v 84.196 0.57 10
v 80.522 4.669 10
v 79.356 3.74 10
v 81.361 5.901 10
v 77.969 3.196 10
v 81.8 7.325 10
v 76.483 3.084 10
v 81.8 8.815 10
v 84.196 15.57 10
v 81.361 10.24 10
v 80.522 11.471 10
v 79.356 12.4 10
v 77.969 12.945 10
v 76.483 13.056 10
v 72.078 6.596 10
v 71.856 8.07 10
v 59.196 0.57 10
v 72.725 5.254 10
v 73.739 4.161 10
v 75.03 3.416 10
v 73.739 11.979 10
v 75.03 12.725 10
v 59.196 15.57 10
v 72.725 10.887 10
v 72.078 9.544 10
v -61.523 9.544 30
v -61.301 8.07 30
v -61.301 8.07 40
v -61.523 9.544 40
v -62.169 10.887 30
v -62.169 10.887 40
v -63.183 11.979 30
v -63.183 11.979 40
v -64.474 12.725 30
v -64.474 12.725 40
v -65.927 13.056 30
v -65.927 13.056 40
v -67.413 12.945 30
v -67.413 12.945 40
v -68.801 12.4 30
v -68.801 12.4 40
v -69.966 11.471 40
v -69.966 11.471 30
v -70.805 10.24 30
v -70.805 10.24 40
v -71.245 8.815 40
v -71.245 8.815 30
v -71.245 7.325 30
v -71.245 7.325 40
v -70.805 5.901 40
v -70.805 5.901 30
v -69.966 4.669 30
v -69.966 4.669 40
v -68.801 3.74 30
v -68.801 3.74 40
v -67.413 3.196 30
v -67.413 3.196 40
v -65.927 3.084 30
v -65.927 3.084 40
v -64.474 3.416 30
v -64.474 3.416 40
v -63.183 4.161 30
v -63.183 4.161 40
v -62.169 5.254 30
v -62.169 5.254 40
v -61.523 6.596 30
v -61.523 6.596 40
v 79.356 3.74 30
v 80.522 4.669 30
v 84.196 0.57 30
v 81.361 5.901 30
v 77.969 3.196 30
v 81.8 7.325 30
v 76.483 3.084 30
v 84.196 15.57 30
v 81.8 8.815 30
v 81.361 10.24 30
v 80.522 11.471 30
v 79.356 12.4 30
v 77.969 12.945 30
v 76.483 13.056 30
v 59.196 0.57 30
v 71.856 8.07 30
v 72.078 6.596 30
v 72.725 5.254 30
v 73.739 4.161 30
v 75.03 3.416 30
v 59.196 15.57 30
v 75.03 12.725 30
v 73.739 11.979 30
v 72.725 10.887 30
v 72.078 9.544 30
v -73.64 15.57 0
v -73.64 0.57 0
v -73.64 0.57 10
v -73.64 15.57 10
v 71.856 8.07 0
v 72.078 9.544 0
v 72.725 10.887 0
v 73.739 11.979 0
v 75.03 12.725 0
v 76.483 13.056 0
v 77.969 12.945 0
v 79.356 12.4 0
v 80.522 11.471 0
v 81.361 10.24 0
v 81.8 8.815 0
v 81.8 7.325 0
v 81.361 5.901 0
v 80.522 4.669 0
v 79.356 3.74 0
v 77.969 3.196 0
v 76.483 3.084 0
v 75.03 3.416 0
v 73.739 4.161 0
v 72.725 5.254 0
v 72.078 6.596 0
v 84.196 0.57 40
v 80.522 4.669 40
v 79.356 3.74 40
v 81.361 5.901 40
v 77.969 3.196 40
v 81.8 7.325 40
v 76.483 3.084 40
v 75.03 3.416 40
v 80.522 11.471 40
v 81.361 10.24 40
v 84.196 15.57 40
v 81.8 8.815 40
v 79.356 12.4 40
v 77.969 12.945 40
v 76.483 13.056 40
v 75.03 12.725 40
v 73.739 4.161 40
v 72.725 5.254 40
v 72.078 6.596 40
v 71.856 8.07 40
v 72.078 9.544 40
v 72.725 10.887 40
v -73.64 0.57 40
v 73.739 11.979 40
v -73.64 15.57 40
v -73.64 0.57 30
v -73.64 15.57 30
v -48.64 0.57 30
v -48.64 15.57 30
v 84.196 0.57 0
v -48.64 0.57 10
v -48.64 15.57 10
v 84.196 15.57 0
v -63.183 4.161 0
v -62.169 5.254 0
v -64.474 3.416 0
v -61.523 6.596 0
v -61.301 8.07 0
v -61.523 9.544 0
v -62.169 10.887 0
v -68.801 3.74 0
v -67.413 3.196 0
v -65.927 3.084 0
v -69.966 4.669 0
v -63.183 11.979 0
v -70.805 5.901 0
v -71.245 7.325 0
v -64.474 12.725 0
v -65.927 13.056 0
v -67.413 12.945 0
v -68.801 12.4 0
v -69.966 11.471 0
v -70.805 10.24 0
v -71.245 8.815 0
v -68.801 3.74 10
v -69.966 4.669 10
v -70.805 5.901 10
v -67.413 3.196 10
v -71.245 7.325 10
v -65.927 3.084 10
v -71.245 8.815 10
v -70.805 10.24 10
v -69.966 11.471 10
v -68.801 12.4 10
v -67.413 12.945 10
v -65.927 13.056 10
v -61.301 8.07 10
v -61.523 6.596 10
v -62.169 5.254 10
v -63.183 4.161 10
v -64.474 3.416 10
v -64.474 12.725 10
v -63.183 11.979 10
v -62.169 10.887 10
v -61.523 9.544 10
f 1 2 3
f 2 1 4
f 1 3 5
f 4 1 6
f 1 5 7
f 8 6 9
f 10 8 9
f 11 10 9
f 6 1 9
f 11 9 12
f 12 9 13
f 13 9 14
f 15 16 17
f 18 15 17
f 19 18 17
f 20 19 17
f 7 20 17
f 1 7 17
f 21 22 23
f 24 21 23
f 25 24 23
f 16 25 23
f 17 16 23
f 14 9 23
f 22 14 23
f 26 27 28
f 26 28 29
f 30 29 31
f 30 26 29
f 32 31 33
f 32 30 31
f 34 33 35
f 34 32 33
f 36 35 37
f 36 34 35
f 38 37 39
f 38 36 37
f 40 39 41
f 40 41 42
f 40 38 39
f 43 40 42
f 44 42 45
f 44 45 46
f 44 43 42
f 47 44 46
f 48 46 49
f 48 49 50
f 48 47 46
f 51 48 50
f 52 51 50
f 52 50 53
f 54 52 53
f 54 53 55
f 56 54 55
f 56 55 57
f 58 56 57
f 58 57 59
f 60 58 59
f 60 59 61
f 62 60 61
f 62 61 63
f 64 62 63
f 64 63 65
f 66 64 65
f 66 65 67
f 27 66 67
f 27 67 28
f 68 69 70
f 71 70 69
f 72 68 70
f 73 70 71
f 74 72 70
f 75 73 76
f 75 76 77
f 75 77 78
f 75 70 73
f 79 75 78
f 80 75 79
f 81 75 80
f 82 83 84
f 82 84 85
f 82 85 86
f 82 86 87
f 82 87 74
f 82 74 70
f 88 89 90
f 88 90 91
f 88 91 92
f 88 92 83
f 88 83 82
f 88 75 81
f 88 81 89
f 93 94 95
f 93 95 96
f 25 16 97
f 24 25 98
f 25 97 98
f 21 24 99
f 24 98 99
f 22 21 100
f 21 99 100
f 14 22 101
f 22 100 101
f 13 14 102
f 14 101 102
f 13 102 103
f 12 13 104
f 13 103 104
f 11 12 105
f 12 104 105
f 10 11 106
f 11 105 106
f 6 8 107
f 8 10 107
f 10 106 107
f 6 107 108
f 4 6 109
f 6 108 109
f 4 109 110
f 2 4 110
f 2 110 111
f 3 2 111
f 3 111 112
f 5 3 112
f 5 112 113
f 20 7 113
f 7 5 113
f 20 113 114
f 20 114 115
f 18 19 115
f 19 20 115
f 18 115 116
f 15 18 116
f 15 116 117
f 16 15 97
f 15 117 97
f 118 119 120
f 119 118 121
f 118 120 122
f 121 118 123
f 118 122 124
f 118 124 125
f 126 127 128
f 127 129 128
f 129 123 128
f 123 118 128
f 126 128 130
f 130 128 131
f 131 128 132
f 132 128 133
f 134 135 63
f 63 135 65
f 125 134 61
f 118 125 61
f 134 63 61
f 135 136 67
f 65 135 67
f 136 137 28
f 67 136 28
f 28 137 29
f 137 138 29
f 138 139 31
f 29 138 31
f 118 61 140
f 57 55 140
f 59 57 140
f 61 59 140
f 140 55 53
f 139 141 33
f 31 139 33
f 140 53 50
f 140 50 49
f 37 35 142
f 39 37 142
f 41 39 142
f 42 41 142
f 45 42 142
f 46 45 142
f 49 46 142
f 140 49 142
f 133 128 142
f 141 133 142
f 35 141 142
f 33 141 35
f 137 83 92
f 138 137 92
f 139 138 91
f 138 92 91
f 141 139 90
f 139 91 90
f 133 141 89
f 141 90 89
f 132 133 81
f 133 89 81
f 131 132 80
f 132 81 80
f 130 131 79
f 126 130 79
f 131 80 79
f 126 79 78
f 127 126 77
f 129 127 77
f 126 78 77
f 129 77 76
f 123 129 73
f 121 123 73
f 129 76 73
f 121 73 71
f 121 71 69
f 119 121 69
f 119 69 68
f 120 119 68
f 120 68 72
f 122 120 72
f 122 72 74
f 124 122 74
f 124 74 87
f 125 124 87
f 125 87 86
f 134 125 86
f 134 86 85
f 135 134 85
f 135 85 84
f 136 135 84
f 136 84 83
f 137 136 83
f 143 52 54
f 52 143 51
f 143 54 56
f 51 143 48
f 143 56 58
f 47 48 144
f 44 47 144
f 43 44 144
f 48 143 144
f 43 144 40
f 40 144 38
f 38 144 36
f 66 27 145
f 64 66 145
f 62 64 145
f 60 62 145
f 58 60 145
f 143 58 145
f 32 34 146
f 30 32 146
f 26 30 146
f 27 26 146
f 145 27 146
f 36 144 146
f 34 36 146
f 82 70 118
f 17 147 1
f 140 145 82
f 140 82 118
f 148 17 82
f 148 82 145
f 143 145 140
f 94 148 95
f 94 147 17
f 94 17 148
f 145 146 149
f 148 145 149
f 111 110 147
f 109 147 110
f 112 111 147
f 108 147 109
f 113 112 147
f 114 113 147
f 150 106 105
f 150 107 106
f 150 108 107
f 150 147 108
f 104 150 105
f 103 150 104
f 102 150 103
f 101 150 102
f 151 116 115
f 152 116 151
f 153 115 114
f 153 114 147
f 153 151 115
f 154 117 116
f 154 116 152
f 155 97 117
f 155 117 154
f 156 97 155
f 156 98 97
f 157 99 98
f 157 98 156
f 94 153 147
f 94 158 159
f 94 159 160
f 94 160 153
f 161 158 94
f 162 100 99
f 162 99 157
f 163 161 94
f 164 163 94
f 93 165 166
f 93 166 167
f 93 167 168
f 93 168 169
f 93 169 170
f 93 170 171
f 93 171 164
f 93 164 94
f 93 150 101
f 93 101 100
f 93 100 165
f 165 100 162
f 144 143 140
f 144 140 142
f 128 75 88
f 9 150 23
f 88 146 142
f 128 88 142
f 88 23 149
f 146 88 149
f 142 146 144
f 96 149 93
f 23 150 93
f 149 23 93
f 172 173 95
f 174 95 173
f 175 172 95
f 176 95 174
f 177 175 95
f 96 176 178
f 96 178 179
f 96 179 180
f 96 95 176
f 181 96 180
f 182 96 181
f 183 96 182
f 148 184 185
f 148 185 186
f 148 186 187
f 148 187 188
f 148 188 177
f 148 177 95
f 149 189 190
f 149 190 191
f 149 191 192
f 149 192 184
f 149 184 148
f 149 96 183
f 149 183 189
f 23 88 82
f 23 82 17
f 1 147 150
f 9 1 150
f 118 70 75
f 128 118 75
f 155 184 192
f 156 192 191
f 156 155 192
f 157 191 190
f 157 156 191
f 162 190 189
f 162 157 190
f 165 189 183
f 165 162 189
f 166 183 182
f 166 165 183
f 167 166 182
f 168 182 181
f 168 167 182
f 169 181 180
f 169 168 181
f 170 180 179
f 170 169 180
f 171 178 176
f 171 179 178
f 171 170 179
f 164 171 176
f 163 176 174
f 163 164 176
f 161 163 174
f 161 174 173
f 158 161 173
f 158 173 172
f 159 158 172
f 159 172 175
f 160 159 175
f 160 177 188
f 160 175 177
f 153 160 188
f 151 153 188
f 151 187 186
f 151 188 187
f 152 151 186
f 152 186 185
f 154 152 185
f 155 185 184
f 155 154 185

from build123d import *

# Parameters (mm, degrees)
SKETCH_1_W          = 200
SKETCH_1_H          = 15
SKETCH_1_R          = 5
EXTRUDE_2_DEPTH     = 40
SKETCH_2_W          = 50
SKETCH_2_H          = 20
CUT_EXTRUDE_2_DEPTH = 40
SKETCH_3_W          = 242.163651579
SKETCH_3_H          = 102.30151502
CUT_EXTRUDE_3_DEPTH = 40


with BuildPart() as part:
    # 草图1 → 凸台-拉伸2 (new body)
    with BuildSketch(Plane.XY):
        with Locations((26.359649123, 8.070175439)):
            Rectangle(SKETCH_1_W, SKETCH_1_H)
        with Locations((-66.300631579, 8.070175439)):
            Circle(SKETCH_1_R, mode=Mode.SUBTRACT)
        with Locations((118.699368421, 8.070175439)):
            Circle(SKETCH_1_R, mode=Mode.SUBTRACT)
    extrude(amount=EXTRUDE_2_DEPTH)

    # 草图2 → 切除-拉伸2 (cut)
    with BuildSketch(Plane(origin=(0, 15.570175439, 0), x_dir=(1, 0, 0), z_dir=(0, 1, 0))):
        with Locations((-73.640350877, -20)):
            Rectangle(SKETCH_2_W, SKETCH_2_H)
        with Locations((126.359649123, -20)):
            Rectangle(SKETCH_2_W, SKETCH_2_H)
    extrude(amount=-CUT_EXTRUDE_2_DEPTH, mode=Mode.SUBTRACT)

    # 草图3 → 切除-拉伸3 (cut)
    with BuildSketch(Plane(origin=(0, 15.570175439, 0), x_dir=(1, 0, 0), z_dir=(0, 1, 0))):
        with Locations((126.359649123, 0)):
            Rectangle(SKETCH_3_W, SKETCH_3_H)
    extrude(amount=-CUT_EXTRUDE_3_DEPTH, mode=Mode.SUBTRACT)

    # 镜向2: part across plane


with BuildPart() as part_1:
    add(part.part)
    add(part.part.mirror(Plane(origin=(5.277823333, -24.429824561, -51.15075751), x_dir=(0, 0, 1), z_dir=(-1, 0, 0))))


solid = part_1.part
